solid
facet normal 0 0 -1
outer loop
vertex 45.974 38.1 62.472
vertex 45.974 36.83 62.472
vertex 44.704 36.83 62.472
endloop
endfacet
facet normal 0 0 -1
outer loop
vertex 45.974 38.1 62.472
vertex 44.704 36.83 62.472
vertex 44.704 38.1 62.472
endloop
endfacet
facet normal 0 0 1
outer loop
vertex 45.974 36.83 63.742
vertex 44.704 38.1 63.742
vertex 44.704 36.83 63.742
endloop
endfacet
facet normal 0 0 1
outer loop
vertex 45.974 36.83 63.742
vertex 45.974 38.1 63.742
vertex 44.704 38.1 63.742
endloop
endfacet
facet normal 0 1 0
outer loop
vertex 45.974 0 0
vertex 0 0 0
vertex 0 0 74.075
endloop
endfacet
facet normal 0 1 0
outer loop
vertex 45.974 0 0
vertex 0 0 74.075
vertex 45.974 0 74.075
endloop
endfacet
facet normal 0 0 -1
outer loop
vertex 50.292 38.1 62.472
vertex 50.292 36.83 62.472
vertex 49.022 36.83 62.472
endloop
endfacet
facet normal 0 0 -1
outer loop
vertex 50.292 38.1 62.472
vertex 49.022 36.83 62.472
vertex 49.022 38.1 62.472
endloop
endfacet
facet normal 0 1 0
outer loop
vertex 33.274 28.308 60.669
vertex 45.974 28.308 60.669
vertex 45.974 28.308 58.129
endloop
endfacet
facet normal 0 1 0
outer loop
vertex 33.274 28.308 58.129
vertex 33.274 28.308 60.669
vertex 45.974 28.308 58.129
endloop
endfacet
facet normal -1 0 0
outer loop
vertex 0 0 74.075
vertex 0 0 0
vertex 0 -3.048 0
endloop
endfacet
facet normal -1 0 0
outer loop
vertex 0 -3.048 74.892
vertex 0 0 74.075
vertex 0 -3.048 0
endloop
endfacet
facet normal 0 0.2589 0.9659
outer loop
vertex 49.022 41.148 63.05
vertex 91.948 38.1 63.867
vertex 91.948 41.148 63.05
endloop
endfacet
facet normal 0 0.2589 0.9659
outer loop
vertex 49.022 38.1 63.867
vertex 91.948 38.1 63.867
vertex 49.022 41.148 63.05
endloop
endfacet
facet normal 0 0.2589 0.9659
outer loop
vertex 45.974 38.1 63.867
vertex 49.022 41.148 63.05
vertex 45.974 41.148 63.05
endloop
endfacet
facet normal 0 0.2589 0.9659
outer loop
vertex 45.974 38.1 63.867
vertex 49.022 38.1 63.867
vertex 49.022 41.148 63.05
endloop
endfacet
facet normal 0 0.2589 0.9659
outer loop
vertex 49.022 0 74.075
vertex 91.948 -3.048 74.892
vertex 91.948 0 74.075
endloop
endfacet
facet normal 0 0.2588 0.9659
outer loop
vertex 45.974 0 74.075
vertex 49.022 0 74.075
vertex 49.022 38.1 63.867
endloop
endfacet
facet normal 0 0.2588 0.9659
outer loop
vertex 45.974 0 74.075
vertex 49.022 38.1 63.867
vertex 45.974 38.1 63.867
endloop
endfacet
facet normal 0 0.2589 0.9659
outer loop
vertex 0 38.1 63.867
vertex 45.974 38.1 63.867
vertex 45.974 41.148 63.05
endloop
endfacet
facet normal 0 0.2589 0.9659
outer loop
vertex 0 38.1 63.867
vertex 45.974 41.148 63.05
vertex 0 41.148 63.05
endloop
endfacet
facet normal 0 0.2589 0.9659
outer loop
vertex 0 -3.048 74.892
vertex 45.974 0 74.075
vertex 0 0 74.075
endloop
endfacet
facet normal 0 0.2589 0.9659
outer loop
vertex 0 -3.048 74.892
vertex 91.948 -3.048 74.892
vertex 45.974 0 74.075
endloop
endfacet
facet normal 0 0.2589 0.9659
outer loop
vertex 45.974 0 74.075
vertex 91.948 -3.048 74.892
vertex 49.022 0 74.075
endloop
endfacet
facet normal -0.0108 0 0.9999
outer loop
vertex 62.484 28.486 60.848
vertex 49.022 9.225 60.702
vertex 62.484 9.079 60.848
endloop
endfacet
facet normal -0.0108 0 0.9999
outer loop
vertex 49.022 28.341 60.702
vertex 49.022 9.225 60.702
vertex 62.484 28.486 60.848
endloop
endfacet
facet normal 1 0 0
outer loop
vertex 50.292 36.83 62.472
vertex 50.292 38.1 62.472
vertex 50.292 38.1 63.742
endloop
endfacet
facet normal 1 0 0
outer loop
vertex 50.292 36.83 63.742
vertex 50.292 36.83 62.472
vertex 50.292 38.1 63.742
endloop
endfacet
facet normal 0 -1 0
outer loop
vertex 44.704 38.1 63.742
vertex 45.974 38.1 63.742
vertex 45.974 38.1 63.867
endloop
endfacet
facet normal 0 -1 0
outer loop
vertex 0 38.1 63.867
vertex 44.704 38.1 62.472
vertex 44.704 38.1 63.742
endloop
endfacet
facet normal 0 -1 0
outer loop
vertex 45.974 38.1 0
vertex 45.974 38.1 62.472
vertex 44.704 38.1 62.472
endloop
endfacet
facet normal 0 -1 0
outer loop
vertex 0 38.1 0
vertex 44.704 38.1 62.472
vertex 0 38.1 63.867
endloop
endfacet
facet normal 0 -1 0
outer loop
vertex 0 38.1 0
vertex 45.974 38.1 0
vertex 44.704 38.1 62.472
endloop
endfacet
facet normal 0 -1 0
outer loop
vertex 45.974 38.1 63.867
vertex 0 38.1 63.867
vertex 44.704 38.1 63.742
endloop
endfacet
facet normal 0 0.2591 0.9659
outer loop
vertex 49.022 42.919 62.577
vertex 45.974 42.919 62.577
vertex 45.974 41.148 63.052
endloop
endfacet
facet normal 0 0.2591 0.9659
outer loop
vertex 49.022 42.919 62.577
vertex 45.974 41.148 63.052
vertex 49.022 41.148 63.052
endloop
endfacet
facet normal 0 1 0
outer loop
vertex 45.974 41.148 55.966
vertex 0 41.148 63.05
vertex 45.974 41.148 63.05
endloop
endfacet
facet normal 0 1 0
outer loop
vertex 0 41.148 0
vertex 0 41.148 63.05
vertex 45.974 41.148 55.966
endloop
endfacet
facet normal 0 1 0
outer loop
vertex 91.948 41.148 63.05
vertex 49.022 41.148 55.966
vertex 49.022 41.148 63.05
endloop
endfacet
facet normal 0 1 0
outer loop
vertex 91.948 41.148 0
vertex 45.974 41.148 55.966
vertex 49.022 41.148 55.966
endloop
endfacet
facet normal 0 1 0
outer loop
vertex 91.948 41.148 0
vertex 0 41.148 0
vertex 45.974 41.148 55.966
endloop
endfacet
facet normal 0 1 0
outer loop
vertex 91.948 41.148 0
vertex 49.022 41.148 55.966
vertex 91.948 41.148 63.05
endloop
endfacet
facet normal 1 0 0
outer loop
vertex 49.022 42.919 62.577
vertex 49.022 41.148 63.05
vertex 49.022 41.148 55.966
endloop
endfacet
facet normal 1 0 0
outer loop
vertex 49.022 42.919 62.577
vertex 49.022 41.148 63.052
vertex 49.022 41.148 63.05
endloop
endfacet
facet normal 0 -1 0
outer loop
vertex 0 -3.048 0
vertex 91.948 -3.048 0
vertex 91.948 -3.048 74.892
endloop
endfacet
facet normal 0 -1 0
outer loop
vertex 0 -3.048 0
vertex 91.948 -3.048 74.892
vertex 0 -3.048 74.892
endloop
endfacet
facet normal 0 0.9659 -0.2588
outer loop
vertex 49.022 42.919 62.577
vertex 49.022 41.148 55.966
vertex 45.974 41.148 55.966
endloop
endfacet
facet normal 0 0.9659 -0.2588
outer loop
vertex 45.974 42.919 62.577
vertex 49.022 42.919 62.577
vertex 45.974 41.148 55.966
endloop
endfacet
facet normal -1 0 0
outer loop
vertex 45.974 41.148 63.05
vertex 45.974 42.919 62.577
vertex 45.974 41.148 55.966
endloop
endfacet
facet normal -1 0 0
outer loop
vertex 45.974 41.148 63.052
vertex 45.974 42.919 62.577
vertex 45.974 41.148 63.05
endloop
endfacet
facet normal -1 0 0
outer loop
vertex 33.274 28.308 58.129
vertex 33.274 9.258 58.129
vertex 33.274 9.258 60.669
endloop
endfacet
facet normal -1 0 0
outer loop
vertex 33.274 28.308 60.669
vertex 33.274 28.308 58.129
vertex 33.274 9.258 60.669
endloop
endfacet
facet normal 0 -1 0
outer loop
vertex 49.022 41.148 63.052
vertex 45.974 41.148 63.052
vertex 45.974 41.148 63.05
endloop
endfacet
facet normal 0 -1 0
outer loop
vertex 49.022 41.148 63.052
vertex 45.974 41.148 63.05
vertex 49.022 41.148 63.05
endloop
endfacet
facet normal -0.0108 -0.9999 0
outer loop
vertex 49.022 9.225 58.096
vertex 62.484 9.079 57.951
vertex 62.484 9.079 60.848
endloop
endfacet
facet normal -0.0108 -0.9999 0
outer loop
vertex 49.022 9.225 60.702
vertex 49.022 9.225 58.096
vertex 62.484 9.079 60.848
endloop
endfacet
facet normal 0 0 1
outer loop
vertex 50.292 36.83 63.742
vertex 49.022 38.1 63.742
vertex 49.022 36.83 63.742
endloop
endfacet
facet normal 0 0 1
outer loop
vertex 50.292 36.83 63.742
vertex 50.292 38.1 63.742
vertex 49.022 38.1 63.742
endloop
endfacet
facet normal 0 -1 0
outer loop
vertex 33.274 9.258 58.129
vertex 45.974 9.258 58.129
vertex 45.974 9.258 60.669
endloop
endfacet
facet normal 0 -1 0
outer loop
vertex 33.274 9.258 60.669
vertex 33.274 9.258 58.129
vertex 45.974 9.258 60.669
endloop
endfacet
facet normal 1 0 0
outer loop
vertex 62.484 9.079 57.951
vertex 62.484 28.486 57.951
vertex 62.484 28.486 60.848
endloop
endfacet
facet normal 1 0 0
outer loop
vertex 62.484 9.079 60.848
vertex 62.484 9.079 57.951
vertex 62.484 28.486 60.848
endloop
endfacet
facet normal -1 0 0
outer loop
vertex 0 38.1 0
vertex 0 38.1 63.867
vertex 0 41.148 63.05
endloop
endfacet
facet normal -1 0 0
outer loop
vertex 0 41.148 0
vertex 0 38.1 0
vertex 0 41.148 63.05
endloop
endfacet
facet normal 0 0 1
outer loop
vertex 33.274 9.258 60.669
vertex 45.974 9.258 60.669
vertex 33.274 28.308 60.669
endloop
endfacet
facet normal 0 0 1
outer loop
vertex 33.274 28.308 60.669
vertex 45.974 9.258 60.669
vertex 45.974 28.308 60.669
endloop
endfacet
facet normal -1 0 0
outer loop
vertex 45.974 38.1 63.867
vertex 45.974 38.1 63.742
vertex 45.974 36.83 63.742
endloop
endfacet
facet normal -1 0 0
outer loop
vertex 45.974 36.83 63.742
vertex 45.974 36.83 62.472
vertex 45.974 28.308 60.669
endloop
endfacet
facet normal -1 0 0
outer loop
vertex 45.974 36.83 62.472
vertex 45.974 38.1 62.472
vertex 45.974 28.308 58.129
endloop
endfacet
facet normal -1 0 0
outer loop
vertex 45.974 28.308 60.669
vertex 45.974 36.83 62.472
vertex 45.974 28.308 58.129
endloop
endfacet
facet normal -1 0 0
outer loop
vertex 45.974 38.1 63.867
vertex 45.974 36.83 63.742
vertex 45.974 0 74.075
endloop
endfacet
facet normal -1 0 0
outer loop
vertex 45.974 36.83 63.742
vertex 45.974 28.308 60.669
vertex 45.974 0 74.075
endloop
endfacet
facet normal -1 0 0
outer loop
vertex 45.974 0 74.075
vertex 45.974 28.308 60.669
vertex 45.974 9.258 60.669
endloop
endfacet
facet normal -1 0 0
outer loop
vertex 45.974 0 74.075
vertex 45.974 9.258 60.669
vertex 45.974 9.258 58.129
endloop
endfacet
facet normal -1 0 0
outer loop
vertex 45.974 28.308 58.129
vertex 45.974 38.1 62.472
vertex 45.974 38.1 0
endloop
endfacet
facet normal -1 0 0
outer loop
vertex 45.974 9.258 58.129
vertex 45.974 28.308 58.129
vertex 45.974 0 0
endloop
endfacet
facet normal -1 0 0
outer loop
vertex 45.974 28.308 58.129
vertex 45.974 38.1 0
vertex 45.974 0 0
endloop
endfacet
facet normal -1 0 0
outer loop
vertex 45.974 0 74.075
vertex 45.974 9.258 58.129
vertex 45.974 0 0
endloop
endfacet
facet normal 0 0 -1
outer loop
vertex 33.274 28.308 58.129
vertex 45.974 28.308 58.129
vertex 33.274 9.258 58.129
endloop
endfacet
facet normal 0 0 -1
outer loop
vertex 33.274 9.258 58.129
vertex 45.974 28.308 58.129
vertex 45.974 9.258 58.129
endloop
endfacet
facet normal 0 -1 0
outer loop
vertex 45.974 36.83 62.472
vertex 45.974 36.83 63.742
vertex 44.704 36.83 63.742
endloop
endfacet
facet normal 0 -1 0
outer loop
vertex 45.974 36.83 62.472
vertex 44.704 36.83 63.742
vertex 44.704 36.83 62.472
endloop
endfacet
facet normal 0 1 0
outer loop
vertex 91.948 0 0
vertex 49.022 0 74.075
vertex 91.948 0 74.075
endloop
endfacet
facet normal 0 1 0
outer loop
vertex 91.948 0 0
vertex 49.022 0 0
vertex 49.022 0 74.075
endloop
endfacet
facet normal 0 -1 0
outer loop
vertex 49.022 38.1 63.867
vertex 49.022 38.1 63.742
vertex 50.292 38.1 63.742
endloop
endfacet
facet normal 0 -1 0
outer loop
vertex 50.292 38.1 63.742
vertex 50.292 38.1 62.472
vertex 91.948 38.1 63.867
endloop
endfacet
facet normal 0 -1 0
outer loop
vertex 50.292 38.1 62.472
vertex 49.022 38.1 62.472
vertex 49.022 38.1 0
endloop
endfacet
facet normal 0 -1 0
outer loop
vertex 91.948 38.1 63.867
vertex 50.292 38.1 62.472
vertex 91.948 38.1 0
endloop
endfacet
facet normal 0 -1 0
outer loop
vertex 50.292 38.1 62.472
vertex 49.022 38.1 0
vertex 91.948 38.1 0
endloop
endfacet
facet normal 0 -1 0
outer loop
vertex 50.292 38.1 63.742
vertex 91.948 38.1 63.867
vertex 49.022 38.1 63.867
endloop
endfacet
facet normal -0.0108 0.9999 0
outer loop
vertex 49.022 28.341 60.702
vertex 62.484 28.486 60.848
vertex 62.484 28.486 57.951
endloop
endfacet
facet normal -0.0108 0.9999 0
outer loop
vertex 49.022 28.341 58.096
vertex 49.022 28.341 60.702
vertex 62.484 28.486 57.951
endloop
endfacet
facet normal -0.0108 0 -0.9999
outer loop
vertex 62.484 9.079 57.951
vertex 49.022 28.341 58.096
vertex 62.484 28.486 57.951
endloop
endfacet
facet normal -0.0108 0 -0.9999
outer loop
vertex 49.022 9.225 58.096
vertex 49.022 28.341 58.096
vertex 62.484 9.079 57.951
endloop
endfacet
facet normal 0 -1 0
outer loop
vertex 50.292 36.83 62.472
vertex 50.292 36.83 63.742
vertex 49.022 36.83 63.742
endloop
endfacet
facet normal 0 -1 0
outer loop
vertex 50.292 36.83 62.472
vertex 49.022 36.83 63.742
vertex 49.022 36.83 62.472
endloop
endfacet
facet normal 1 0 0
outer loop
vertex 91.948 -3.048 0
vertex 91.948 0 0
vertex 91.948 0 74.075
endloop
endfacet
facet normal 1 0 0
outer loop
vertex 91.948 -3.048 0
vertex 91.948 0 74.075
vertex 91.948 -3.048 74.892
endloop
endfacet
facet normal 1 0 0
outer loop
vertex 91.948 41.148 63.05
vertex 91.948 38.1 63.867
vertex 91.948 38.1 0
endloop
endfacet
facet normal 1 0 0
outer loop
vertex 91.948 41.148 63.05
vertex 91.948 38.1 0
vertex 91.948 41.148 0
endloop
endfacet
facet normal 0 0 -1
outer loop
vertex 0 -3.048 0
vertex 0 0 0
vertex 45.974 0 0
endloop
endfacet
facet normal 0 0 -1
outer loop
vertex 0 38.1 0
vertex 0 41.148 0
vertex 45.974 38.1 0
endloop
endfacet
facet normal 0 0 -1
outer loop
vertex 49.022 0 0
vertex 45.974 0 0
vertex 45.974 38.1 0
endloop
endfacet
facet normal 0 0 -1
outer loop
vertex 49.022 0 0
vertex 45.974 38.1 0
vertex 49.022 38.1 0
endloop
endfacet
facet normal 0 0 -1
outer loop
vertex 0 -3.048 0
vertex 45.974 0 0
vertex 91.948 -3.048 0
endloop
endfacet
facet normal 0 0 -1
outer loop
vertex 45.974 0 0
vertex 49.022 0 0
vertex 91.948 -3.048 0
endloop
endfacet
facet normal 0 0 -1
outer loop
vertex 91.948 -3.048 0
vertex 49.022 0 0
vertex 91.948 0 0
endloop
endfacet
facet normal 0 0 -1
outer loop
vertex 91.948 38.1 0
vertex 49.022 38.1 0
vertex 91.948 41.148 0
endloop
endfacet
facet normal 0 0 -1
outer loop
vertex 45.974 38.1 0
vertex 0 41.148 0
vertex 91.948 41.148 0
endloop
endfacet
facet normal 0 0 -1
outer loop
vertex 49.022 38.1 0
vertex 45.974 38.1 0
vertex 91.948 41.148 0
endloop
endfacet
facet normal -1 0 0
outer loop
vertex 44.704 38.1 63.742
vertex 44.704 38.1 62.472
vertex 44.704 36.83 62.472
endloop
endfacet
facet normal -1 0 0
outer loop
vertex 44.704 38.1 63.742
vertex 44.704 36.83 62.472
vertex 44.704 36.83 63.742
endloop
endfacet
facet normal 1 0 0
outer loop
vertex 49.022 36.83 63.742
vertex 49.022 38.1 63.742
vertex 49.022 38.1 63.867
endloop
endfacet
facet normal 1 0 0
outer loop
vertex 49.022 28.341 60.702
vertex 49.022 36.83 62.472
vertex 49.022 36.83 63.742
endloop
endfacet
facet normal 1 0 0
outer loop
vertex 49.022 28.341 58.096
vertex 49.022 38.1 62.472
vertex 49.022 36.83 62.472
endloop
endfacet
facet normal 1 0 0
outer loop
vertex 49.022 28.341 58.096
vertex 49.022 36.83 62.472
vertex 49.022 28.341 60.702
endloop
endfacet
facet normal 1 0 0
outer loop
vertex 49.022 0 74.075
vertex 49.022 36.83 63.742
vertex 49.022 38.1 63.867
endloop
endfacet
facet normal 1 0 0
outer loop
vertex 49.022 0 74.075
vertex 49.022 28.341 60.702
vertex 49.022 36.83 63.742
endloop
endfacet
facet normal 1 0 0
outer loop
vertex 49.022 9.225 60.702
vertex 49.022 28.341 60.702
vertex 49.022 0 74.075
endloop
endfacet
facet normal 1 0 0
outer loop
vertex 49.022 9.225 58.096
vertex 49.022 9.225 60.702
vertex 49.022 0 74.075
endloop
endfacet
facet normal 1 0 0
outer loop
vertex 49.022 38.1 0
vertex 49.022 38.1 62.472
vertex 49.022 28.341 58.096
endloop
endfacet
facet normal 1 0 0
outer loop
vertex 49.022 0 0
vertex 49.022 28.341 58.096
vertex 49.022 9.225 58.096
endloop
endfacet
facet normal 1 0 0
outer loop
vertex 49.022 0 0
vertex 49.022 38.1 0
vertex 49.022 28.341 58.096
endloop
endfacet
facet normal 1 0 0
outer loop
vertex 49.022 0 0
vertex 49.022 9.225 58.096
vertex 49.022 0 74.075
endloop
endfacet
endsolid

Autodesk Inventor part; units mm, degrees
ref_plane "YZ Plane" through (0, 0, 0) normal (1, 0, 0) x (0, 1, 0)
ref_plane "XZ Plane" through (0, 0, 0) normal (0, 1, 0) x (-1, 0, 0)
sketch "Sketch1" plane through (0, 0, 0) normal (0, 0, 1) x (1, 0, 0)
  line L0 (0, 41.148) -> (91.948, 41.148)
  line L1 (91.948, -3.048) -> (0, -3.048)
  line L2 (0, 38.1) -> (0, 41.148)
  line L3 (0, 0) -> (0, -3.048)
  line L4 (88.9, 38.1) -> (91.948, 38.1)
  line L5 (88.9, 0) -> (91.948, 0)
  line L6 (91.948, 38.1) -> (91.948, 41.148)
  line L7 (91.948, 0) -> (91.948, -3.048)
  line L8 (45.974, 38.1) -> (45.974, 0)
  line L9 (49.022, 38.1) -> (49.022, 0)
  line L10 (88.9, 38.1) -> (49.022, 38.1)
  line L11 (45.974, 38.1) -> (0, 38.1)
  line L12 (0, 0) -> (45.974, 0)
  line L13 (49.022, 0) -> (88.9, 0)
  dimension "d0" = 88.9
  dimension "d17" = 3.048
extrude "Extrusion6" add sketch "Sketch1" along normal blind 76.2
ref_plane "Work Plane4" through (91.948, 37.861, 63.9327) normal (0, 0.258819, 0.9659258) x (-1, 0, 0)
ref_plane "Work Plane3" through (91.948, 41.148, 76.2) normal (0, 0.258819, 0.9659258) x (-1, 0, 0)
sketch "Sketch6" plane through (91.948, 37.861, 63.9327) normal (0, 0.258819, 0.9659258) x (-1, 0, 0)
  line L0 (-2.4638, -7.3313) -> (94.6916, -7.3313)
  line L1 (94.6916, -7.3313) -> (94.6916, 43.8286)
  line L2 (94.6916, 43.8286) -> (-2.4638, 43.8286)
  line L3 (-2.4638, 43.8286) -> (-2.4638, -7.3313)
  point P0 (91.948, 20.0239)
extrude "Extrusion7" cut sketch "Sketch6" along normal blind 25.4
sketch "Sketch7" plane through (45.974, 0, 0) normal (-1, 0, 0) x (0, 0, 1)
  line L0 (0, 38.1) -> (63.8687, 38.1) projected
  line L1 (62.4717, 38.1) -> (63.7417, 38.1)
  line L2 (63.7417, 38.1) -> (63.7417, 36.83)
  line L3 (63.7417, 36.83) -> (62.4717, 36.83)
  line L4 (62.4717, 36.83) -> (62.4717, 38.1)
  dimension "d24" = 1.27
  dimension "d25" = 1.27
  dimension "d26" = 0.127
extrude "Extrusion8" add sketch "Sketch7" along normal blind 1.27 and the other way blind 4.318
sketch "Sketch8" plane through (91.948, 37.861, 63.9327) normal (0, 0.258819, 0.9659258) x (1, 0, 0)
  line L0 (-91.948, 3.403) -> (0, 3.403) projected
  line L1 (-45.974, 3.403) -> (-42.926, 3.403)
  line L2 (-42.926, 3.403) -> (-42.926, 5.2369)
  line L3 (-42.926, 5.2369) -> (-45.974, 5.2369)
  line L4 (-45.974, 5.2369) -> (-45.974, 3.403)
  point P0 (-91.948, -20.0239)
extrude "Extrusion9" add sketch "Sketch8" against normal blind 12.7
sketch "Sketch10" plane through (45.974, 0, 0) normal (-1, 0, 0) x (0, 0, 1)
  line L0 (58.1292, 9.2578) -> (60.6692, 9.2578)
  line L1 (60.6692, 9.2578) -> (60.6692, 28.3078)
  line L2 (60.6692, 28.3078) -> (58.1292, 28.3078)
  line L3 (58.1292, 28.3078) -> (58.1292, 9.2578)
  dimension "d40" = 2.54
  dimension "d41" = 19.05
extrude "Extrusion11" add sketch "Sketch10" along normal blind 12.7 and the other way blind 16.51 draft 0.62
properties part number "2p1rim1" material "Steel, Galvanized"
